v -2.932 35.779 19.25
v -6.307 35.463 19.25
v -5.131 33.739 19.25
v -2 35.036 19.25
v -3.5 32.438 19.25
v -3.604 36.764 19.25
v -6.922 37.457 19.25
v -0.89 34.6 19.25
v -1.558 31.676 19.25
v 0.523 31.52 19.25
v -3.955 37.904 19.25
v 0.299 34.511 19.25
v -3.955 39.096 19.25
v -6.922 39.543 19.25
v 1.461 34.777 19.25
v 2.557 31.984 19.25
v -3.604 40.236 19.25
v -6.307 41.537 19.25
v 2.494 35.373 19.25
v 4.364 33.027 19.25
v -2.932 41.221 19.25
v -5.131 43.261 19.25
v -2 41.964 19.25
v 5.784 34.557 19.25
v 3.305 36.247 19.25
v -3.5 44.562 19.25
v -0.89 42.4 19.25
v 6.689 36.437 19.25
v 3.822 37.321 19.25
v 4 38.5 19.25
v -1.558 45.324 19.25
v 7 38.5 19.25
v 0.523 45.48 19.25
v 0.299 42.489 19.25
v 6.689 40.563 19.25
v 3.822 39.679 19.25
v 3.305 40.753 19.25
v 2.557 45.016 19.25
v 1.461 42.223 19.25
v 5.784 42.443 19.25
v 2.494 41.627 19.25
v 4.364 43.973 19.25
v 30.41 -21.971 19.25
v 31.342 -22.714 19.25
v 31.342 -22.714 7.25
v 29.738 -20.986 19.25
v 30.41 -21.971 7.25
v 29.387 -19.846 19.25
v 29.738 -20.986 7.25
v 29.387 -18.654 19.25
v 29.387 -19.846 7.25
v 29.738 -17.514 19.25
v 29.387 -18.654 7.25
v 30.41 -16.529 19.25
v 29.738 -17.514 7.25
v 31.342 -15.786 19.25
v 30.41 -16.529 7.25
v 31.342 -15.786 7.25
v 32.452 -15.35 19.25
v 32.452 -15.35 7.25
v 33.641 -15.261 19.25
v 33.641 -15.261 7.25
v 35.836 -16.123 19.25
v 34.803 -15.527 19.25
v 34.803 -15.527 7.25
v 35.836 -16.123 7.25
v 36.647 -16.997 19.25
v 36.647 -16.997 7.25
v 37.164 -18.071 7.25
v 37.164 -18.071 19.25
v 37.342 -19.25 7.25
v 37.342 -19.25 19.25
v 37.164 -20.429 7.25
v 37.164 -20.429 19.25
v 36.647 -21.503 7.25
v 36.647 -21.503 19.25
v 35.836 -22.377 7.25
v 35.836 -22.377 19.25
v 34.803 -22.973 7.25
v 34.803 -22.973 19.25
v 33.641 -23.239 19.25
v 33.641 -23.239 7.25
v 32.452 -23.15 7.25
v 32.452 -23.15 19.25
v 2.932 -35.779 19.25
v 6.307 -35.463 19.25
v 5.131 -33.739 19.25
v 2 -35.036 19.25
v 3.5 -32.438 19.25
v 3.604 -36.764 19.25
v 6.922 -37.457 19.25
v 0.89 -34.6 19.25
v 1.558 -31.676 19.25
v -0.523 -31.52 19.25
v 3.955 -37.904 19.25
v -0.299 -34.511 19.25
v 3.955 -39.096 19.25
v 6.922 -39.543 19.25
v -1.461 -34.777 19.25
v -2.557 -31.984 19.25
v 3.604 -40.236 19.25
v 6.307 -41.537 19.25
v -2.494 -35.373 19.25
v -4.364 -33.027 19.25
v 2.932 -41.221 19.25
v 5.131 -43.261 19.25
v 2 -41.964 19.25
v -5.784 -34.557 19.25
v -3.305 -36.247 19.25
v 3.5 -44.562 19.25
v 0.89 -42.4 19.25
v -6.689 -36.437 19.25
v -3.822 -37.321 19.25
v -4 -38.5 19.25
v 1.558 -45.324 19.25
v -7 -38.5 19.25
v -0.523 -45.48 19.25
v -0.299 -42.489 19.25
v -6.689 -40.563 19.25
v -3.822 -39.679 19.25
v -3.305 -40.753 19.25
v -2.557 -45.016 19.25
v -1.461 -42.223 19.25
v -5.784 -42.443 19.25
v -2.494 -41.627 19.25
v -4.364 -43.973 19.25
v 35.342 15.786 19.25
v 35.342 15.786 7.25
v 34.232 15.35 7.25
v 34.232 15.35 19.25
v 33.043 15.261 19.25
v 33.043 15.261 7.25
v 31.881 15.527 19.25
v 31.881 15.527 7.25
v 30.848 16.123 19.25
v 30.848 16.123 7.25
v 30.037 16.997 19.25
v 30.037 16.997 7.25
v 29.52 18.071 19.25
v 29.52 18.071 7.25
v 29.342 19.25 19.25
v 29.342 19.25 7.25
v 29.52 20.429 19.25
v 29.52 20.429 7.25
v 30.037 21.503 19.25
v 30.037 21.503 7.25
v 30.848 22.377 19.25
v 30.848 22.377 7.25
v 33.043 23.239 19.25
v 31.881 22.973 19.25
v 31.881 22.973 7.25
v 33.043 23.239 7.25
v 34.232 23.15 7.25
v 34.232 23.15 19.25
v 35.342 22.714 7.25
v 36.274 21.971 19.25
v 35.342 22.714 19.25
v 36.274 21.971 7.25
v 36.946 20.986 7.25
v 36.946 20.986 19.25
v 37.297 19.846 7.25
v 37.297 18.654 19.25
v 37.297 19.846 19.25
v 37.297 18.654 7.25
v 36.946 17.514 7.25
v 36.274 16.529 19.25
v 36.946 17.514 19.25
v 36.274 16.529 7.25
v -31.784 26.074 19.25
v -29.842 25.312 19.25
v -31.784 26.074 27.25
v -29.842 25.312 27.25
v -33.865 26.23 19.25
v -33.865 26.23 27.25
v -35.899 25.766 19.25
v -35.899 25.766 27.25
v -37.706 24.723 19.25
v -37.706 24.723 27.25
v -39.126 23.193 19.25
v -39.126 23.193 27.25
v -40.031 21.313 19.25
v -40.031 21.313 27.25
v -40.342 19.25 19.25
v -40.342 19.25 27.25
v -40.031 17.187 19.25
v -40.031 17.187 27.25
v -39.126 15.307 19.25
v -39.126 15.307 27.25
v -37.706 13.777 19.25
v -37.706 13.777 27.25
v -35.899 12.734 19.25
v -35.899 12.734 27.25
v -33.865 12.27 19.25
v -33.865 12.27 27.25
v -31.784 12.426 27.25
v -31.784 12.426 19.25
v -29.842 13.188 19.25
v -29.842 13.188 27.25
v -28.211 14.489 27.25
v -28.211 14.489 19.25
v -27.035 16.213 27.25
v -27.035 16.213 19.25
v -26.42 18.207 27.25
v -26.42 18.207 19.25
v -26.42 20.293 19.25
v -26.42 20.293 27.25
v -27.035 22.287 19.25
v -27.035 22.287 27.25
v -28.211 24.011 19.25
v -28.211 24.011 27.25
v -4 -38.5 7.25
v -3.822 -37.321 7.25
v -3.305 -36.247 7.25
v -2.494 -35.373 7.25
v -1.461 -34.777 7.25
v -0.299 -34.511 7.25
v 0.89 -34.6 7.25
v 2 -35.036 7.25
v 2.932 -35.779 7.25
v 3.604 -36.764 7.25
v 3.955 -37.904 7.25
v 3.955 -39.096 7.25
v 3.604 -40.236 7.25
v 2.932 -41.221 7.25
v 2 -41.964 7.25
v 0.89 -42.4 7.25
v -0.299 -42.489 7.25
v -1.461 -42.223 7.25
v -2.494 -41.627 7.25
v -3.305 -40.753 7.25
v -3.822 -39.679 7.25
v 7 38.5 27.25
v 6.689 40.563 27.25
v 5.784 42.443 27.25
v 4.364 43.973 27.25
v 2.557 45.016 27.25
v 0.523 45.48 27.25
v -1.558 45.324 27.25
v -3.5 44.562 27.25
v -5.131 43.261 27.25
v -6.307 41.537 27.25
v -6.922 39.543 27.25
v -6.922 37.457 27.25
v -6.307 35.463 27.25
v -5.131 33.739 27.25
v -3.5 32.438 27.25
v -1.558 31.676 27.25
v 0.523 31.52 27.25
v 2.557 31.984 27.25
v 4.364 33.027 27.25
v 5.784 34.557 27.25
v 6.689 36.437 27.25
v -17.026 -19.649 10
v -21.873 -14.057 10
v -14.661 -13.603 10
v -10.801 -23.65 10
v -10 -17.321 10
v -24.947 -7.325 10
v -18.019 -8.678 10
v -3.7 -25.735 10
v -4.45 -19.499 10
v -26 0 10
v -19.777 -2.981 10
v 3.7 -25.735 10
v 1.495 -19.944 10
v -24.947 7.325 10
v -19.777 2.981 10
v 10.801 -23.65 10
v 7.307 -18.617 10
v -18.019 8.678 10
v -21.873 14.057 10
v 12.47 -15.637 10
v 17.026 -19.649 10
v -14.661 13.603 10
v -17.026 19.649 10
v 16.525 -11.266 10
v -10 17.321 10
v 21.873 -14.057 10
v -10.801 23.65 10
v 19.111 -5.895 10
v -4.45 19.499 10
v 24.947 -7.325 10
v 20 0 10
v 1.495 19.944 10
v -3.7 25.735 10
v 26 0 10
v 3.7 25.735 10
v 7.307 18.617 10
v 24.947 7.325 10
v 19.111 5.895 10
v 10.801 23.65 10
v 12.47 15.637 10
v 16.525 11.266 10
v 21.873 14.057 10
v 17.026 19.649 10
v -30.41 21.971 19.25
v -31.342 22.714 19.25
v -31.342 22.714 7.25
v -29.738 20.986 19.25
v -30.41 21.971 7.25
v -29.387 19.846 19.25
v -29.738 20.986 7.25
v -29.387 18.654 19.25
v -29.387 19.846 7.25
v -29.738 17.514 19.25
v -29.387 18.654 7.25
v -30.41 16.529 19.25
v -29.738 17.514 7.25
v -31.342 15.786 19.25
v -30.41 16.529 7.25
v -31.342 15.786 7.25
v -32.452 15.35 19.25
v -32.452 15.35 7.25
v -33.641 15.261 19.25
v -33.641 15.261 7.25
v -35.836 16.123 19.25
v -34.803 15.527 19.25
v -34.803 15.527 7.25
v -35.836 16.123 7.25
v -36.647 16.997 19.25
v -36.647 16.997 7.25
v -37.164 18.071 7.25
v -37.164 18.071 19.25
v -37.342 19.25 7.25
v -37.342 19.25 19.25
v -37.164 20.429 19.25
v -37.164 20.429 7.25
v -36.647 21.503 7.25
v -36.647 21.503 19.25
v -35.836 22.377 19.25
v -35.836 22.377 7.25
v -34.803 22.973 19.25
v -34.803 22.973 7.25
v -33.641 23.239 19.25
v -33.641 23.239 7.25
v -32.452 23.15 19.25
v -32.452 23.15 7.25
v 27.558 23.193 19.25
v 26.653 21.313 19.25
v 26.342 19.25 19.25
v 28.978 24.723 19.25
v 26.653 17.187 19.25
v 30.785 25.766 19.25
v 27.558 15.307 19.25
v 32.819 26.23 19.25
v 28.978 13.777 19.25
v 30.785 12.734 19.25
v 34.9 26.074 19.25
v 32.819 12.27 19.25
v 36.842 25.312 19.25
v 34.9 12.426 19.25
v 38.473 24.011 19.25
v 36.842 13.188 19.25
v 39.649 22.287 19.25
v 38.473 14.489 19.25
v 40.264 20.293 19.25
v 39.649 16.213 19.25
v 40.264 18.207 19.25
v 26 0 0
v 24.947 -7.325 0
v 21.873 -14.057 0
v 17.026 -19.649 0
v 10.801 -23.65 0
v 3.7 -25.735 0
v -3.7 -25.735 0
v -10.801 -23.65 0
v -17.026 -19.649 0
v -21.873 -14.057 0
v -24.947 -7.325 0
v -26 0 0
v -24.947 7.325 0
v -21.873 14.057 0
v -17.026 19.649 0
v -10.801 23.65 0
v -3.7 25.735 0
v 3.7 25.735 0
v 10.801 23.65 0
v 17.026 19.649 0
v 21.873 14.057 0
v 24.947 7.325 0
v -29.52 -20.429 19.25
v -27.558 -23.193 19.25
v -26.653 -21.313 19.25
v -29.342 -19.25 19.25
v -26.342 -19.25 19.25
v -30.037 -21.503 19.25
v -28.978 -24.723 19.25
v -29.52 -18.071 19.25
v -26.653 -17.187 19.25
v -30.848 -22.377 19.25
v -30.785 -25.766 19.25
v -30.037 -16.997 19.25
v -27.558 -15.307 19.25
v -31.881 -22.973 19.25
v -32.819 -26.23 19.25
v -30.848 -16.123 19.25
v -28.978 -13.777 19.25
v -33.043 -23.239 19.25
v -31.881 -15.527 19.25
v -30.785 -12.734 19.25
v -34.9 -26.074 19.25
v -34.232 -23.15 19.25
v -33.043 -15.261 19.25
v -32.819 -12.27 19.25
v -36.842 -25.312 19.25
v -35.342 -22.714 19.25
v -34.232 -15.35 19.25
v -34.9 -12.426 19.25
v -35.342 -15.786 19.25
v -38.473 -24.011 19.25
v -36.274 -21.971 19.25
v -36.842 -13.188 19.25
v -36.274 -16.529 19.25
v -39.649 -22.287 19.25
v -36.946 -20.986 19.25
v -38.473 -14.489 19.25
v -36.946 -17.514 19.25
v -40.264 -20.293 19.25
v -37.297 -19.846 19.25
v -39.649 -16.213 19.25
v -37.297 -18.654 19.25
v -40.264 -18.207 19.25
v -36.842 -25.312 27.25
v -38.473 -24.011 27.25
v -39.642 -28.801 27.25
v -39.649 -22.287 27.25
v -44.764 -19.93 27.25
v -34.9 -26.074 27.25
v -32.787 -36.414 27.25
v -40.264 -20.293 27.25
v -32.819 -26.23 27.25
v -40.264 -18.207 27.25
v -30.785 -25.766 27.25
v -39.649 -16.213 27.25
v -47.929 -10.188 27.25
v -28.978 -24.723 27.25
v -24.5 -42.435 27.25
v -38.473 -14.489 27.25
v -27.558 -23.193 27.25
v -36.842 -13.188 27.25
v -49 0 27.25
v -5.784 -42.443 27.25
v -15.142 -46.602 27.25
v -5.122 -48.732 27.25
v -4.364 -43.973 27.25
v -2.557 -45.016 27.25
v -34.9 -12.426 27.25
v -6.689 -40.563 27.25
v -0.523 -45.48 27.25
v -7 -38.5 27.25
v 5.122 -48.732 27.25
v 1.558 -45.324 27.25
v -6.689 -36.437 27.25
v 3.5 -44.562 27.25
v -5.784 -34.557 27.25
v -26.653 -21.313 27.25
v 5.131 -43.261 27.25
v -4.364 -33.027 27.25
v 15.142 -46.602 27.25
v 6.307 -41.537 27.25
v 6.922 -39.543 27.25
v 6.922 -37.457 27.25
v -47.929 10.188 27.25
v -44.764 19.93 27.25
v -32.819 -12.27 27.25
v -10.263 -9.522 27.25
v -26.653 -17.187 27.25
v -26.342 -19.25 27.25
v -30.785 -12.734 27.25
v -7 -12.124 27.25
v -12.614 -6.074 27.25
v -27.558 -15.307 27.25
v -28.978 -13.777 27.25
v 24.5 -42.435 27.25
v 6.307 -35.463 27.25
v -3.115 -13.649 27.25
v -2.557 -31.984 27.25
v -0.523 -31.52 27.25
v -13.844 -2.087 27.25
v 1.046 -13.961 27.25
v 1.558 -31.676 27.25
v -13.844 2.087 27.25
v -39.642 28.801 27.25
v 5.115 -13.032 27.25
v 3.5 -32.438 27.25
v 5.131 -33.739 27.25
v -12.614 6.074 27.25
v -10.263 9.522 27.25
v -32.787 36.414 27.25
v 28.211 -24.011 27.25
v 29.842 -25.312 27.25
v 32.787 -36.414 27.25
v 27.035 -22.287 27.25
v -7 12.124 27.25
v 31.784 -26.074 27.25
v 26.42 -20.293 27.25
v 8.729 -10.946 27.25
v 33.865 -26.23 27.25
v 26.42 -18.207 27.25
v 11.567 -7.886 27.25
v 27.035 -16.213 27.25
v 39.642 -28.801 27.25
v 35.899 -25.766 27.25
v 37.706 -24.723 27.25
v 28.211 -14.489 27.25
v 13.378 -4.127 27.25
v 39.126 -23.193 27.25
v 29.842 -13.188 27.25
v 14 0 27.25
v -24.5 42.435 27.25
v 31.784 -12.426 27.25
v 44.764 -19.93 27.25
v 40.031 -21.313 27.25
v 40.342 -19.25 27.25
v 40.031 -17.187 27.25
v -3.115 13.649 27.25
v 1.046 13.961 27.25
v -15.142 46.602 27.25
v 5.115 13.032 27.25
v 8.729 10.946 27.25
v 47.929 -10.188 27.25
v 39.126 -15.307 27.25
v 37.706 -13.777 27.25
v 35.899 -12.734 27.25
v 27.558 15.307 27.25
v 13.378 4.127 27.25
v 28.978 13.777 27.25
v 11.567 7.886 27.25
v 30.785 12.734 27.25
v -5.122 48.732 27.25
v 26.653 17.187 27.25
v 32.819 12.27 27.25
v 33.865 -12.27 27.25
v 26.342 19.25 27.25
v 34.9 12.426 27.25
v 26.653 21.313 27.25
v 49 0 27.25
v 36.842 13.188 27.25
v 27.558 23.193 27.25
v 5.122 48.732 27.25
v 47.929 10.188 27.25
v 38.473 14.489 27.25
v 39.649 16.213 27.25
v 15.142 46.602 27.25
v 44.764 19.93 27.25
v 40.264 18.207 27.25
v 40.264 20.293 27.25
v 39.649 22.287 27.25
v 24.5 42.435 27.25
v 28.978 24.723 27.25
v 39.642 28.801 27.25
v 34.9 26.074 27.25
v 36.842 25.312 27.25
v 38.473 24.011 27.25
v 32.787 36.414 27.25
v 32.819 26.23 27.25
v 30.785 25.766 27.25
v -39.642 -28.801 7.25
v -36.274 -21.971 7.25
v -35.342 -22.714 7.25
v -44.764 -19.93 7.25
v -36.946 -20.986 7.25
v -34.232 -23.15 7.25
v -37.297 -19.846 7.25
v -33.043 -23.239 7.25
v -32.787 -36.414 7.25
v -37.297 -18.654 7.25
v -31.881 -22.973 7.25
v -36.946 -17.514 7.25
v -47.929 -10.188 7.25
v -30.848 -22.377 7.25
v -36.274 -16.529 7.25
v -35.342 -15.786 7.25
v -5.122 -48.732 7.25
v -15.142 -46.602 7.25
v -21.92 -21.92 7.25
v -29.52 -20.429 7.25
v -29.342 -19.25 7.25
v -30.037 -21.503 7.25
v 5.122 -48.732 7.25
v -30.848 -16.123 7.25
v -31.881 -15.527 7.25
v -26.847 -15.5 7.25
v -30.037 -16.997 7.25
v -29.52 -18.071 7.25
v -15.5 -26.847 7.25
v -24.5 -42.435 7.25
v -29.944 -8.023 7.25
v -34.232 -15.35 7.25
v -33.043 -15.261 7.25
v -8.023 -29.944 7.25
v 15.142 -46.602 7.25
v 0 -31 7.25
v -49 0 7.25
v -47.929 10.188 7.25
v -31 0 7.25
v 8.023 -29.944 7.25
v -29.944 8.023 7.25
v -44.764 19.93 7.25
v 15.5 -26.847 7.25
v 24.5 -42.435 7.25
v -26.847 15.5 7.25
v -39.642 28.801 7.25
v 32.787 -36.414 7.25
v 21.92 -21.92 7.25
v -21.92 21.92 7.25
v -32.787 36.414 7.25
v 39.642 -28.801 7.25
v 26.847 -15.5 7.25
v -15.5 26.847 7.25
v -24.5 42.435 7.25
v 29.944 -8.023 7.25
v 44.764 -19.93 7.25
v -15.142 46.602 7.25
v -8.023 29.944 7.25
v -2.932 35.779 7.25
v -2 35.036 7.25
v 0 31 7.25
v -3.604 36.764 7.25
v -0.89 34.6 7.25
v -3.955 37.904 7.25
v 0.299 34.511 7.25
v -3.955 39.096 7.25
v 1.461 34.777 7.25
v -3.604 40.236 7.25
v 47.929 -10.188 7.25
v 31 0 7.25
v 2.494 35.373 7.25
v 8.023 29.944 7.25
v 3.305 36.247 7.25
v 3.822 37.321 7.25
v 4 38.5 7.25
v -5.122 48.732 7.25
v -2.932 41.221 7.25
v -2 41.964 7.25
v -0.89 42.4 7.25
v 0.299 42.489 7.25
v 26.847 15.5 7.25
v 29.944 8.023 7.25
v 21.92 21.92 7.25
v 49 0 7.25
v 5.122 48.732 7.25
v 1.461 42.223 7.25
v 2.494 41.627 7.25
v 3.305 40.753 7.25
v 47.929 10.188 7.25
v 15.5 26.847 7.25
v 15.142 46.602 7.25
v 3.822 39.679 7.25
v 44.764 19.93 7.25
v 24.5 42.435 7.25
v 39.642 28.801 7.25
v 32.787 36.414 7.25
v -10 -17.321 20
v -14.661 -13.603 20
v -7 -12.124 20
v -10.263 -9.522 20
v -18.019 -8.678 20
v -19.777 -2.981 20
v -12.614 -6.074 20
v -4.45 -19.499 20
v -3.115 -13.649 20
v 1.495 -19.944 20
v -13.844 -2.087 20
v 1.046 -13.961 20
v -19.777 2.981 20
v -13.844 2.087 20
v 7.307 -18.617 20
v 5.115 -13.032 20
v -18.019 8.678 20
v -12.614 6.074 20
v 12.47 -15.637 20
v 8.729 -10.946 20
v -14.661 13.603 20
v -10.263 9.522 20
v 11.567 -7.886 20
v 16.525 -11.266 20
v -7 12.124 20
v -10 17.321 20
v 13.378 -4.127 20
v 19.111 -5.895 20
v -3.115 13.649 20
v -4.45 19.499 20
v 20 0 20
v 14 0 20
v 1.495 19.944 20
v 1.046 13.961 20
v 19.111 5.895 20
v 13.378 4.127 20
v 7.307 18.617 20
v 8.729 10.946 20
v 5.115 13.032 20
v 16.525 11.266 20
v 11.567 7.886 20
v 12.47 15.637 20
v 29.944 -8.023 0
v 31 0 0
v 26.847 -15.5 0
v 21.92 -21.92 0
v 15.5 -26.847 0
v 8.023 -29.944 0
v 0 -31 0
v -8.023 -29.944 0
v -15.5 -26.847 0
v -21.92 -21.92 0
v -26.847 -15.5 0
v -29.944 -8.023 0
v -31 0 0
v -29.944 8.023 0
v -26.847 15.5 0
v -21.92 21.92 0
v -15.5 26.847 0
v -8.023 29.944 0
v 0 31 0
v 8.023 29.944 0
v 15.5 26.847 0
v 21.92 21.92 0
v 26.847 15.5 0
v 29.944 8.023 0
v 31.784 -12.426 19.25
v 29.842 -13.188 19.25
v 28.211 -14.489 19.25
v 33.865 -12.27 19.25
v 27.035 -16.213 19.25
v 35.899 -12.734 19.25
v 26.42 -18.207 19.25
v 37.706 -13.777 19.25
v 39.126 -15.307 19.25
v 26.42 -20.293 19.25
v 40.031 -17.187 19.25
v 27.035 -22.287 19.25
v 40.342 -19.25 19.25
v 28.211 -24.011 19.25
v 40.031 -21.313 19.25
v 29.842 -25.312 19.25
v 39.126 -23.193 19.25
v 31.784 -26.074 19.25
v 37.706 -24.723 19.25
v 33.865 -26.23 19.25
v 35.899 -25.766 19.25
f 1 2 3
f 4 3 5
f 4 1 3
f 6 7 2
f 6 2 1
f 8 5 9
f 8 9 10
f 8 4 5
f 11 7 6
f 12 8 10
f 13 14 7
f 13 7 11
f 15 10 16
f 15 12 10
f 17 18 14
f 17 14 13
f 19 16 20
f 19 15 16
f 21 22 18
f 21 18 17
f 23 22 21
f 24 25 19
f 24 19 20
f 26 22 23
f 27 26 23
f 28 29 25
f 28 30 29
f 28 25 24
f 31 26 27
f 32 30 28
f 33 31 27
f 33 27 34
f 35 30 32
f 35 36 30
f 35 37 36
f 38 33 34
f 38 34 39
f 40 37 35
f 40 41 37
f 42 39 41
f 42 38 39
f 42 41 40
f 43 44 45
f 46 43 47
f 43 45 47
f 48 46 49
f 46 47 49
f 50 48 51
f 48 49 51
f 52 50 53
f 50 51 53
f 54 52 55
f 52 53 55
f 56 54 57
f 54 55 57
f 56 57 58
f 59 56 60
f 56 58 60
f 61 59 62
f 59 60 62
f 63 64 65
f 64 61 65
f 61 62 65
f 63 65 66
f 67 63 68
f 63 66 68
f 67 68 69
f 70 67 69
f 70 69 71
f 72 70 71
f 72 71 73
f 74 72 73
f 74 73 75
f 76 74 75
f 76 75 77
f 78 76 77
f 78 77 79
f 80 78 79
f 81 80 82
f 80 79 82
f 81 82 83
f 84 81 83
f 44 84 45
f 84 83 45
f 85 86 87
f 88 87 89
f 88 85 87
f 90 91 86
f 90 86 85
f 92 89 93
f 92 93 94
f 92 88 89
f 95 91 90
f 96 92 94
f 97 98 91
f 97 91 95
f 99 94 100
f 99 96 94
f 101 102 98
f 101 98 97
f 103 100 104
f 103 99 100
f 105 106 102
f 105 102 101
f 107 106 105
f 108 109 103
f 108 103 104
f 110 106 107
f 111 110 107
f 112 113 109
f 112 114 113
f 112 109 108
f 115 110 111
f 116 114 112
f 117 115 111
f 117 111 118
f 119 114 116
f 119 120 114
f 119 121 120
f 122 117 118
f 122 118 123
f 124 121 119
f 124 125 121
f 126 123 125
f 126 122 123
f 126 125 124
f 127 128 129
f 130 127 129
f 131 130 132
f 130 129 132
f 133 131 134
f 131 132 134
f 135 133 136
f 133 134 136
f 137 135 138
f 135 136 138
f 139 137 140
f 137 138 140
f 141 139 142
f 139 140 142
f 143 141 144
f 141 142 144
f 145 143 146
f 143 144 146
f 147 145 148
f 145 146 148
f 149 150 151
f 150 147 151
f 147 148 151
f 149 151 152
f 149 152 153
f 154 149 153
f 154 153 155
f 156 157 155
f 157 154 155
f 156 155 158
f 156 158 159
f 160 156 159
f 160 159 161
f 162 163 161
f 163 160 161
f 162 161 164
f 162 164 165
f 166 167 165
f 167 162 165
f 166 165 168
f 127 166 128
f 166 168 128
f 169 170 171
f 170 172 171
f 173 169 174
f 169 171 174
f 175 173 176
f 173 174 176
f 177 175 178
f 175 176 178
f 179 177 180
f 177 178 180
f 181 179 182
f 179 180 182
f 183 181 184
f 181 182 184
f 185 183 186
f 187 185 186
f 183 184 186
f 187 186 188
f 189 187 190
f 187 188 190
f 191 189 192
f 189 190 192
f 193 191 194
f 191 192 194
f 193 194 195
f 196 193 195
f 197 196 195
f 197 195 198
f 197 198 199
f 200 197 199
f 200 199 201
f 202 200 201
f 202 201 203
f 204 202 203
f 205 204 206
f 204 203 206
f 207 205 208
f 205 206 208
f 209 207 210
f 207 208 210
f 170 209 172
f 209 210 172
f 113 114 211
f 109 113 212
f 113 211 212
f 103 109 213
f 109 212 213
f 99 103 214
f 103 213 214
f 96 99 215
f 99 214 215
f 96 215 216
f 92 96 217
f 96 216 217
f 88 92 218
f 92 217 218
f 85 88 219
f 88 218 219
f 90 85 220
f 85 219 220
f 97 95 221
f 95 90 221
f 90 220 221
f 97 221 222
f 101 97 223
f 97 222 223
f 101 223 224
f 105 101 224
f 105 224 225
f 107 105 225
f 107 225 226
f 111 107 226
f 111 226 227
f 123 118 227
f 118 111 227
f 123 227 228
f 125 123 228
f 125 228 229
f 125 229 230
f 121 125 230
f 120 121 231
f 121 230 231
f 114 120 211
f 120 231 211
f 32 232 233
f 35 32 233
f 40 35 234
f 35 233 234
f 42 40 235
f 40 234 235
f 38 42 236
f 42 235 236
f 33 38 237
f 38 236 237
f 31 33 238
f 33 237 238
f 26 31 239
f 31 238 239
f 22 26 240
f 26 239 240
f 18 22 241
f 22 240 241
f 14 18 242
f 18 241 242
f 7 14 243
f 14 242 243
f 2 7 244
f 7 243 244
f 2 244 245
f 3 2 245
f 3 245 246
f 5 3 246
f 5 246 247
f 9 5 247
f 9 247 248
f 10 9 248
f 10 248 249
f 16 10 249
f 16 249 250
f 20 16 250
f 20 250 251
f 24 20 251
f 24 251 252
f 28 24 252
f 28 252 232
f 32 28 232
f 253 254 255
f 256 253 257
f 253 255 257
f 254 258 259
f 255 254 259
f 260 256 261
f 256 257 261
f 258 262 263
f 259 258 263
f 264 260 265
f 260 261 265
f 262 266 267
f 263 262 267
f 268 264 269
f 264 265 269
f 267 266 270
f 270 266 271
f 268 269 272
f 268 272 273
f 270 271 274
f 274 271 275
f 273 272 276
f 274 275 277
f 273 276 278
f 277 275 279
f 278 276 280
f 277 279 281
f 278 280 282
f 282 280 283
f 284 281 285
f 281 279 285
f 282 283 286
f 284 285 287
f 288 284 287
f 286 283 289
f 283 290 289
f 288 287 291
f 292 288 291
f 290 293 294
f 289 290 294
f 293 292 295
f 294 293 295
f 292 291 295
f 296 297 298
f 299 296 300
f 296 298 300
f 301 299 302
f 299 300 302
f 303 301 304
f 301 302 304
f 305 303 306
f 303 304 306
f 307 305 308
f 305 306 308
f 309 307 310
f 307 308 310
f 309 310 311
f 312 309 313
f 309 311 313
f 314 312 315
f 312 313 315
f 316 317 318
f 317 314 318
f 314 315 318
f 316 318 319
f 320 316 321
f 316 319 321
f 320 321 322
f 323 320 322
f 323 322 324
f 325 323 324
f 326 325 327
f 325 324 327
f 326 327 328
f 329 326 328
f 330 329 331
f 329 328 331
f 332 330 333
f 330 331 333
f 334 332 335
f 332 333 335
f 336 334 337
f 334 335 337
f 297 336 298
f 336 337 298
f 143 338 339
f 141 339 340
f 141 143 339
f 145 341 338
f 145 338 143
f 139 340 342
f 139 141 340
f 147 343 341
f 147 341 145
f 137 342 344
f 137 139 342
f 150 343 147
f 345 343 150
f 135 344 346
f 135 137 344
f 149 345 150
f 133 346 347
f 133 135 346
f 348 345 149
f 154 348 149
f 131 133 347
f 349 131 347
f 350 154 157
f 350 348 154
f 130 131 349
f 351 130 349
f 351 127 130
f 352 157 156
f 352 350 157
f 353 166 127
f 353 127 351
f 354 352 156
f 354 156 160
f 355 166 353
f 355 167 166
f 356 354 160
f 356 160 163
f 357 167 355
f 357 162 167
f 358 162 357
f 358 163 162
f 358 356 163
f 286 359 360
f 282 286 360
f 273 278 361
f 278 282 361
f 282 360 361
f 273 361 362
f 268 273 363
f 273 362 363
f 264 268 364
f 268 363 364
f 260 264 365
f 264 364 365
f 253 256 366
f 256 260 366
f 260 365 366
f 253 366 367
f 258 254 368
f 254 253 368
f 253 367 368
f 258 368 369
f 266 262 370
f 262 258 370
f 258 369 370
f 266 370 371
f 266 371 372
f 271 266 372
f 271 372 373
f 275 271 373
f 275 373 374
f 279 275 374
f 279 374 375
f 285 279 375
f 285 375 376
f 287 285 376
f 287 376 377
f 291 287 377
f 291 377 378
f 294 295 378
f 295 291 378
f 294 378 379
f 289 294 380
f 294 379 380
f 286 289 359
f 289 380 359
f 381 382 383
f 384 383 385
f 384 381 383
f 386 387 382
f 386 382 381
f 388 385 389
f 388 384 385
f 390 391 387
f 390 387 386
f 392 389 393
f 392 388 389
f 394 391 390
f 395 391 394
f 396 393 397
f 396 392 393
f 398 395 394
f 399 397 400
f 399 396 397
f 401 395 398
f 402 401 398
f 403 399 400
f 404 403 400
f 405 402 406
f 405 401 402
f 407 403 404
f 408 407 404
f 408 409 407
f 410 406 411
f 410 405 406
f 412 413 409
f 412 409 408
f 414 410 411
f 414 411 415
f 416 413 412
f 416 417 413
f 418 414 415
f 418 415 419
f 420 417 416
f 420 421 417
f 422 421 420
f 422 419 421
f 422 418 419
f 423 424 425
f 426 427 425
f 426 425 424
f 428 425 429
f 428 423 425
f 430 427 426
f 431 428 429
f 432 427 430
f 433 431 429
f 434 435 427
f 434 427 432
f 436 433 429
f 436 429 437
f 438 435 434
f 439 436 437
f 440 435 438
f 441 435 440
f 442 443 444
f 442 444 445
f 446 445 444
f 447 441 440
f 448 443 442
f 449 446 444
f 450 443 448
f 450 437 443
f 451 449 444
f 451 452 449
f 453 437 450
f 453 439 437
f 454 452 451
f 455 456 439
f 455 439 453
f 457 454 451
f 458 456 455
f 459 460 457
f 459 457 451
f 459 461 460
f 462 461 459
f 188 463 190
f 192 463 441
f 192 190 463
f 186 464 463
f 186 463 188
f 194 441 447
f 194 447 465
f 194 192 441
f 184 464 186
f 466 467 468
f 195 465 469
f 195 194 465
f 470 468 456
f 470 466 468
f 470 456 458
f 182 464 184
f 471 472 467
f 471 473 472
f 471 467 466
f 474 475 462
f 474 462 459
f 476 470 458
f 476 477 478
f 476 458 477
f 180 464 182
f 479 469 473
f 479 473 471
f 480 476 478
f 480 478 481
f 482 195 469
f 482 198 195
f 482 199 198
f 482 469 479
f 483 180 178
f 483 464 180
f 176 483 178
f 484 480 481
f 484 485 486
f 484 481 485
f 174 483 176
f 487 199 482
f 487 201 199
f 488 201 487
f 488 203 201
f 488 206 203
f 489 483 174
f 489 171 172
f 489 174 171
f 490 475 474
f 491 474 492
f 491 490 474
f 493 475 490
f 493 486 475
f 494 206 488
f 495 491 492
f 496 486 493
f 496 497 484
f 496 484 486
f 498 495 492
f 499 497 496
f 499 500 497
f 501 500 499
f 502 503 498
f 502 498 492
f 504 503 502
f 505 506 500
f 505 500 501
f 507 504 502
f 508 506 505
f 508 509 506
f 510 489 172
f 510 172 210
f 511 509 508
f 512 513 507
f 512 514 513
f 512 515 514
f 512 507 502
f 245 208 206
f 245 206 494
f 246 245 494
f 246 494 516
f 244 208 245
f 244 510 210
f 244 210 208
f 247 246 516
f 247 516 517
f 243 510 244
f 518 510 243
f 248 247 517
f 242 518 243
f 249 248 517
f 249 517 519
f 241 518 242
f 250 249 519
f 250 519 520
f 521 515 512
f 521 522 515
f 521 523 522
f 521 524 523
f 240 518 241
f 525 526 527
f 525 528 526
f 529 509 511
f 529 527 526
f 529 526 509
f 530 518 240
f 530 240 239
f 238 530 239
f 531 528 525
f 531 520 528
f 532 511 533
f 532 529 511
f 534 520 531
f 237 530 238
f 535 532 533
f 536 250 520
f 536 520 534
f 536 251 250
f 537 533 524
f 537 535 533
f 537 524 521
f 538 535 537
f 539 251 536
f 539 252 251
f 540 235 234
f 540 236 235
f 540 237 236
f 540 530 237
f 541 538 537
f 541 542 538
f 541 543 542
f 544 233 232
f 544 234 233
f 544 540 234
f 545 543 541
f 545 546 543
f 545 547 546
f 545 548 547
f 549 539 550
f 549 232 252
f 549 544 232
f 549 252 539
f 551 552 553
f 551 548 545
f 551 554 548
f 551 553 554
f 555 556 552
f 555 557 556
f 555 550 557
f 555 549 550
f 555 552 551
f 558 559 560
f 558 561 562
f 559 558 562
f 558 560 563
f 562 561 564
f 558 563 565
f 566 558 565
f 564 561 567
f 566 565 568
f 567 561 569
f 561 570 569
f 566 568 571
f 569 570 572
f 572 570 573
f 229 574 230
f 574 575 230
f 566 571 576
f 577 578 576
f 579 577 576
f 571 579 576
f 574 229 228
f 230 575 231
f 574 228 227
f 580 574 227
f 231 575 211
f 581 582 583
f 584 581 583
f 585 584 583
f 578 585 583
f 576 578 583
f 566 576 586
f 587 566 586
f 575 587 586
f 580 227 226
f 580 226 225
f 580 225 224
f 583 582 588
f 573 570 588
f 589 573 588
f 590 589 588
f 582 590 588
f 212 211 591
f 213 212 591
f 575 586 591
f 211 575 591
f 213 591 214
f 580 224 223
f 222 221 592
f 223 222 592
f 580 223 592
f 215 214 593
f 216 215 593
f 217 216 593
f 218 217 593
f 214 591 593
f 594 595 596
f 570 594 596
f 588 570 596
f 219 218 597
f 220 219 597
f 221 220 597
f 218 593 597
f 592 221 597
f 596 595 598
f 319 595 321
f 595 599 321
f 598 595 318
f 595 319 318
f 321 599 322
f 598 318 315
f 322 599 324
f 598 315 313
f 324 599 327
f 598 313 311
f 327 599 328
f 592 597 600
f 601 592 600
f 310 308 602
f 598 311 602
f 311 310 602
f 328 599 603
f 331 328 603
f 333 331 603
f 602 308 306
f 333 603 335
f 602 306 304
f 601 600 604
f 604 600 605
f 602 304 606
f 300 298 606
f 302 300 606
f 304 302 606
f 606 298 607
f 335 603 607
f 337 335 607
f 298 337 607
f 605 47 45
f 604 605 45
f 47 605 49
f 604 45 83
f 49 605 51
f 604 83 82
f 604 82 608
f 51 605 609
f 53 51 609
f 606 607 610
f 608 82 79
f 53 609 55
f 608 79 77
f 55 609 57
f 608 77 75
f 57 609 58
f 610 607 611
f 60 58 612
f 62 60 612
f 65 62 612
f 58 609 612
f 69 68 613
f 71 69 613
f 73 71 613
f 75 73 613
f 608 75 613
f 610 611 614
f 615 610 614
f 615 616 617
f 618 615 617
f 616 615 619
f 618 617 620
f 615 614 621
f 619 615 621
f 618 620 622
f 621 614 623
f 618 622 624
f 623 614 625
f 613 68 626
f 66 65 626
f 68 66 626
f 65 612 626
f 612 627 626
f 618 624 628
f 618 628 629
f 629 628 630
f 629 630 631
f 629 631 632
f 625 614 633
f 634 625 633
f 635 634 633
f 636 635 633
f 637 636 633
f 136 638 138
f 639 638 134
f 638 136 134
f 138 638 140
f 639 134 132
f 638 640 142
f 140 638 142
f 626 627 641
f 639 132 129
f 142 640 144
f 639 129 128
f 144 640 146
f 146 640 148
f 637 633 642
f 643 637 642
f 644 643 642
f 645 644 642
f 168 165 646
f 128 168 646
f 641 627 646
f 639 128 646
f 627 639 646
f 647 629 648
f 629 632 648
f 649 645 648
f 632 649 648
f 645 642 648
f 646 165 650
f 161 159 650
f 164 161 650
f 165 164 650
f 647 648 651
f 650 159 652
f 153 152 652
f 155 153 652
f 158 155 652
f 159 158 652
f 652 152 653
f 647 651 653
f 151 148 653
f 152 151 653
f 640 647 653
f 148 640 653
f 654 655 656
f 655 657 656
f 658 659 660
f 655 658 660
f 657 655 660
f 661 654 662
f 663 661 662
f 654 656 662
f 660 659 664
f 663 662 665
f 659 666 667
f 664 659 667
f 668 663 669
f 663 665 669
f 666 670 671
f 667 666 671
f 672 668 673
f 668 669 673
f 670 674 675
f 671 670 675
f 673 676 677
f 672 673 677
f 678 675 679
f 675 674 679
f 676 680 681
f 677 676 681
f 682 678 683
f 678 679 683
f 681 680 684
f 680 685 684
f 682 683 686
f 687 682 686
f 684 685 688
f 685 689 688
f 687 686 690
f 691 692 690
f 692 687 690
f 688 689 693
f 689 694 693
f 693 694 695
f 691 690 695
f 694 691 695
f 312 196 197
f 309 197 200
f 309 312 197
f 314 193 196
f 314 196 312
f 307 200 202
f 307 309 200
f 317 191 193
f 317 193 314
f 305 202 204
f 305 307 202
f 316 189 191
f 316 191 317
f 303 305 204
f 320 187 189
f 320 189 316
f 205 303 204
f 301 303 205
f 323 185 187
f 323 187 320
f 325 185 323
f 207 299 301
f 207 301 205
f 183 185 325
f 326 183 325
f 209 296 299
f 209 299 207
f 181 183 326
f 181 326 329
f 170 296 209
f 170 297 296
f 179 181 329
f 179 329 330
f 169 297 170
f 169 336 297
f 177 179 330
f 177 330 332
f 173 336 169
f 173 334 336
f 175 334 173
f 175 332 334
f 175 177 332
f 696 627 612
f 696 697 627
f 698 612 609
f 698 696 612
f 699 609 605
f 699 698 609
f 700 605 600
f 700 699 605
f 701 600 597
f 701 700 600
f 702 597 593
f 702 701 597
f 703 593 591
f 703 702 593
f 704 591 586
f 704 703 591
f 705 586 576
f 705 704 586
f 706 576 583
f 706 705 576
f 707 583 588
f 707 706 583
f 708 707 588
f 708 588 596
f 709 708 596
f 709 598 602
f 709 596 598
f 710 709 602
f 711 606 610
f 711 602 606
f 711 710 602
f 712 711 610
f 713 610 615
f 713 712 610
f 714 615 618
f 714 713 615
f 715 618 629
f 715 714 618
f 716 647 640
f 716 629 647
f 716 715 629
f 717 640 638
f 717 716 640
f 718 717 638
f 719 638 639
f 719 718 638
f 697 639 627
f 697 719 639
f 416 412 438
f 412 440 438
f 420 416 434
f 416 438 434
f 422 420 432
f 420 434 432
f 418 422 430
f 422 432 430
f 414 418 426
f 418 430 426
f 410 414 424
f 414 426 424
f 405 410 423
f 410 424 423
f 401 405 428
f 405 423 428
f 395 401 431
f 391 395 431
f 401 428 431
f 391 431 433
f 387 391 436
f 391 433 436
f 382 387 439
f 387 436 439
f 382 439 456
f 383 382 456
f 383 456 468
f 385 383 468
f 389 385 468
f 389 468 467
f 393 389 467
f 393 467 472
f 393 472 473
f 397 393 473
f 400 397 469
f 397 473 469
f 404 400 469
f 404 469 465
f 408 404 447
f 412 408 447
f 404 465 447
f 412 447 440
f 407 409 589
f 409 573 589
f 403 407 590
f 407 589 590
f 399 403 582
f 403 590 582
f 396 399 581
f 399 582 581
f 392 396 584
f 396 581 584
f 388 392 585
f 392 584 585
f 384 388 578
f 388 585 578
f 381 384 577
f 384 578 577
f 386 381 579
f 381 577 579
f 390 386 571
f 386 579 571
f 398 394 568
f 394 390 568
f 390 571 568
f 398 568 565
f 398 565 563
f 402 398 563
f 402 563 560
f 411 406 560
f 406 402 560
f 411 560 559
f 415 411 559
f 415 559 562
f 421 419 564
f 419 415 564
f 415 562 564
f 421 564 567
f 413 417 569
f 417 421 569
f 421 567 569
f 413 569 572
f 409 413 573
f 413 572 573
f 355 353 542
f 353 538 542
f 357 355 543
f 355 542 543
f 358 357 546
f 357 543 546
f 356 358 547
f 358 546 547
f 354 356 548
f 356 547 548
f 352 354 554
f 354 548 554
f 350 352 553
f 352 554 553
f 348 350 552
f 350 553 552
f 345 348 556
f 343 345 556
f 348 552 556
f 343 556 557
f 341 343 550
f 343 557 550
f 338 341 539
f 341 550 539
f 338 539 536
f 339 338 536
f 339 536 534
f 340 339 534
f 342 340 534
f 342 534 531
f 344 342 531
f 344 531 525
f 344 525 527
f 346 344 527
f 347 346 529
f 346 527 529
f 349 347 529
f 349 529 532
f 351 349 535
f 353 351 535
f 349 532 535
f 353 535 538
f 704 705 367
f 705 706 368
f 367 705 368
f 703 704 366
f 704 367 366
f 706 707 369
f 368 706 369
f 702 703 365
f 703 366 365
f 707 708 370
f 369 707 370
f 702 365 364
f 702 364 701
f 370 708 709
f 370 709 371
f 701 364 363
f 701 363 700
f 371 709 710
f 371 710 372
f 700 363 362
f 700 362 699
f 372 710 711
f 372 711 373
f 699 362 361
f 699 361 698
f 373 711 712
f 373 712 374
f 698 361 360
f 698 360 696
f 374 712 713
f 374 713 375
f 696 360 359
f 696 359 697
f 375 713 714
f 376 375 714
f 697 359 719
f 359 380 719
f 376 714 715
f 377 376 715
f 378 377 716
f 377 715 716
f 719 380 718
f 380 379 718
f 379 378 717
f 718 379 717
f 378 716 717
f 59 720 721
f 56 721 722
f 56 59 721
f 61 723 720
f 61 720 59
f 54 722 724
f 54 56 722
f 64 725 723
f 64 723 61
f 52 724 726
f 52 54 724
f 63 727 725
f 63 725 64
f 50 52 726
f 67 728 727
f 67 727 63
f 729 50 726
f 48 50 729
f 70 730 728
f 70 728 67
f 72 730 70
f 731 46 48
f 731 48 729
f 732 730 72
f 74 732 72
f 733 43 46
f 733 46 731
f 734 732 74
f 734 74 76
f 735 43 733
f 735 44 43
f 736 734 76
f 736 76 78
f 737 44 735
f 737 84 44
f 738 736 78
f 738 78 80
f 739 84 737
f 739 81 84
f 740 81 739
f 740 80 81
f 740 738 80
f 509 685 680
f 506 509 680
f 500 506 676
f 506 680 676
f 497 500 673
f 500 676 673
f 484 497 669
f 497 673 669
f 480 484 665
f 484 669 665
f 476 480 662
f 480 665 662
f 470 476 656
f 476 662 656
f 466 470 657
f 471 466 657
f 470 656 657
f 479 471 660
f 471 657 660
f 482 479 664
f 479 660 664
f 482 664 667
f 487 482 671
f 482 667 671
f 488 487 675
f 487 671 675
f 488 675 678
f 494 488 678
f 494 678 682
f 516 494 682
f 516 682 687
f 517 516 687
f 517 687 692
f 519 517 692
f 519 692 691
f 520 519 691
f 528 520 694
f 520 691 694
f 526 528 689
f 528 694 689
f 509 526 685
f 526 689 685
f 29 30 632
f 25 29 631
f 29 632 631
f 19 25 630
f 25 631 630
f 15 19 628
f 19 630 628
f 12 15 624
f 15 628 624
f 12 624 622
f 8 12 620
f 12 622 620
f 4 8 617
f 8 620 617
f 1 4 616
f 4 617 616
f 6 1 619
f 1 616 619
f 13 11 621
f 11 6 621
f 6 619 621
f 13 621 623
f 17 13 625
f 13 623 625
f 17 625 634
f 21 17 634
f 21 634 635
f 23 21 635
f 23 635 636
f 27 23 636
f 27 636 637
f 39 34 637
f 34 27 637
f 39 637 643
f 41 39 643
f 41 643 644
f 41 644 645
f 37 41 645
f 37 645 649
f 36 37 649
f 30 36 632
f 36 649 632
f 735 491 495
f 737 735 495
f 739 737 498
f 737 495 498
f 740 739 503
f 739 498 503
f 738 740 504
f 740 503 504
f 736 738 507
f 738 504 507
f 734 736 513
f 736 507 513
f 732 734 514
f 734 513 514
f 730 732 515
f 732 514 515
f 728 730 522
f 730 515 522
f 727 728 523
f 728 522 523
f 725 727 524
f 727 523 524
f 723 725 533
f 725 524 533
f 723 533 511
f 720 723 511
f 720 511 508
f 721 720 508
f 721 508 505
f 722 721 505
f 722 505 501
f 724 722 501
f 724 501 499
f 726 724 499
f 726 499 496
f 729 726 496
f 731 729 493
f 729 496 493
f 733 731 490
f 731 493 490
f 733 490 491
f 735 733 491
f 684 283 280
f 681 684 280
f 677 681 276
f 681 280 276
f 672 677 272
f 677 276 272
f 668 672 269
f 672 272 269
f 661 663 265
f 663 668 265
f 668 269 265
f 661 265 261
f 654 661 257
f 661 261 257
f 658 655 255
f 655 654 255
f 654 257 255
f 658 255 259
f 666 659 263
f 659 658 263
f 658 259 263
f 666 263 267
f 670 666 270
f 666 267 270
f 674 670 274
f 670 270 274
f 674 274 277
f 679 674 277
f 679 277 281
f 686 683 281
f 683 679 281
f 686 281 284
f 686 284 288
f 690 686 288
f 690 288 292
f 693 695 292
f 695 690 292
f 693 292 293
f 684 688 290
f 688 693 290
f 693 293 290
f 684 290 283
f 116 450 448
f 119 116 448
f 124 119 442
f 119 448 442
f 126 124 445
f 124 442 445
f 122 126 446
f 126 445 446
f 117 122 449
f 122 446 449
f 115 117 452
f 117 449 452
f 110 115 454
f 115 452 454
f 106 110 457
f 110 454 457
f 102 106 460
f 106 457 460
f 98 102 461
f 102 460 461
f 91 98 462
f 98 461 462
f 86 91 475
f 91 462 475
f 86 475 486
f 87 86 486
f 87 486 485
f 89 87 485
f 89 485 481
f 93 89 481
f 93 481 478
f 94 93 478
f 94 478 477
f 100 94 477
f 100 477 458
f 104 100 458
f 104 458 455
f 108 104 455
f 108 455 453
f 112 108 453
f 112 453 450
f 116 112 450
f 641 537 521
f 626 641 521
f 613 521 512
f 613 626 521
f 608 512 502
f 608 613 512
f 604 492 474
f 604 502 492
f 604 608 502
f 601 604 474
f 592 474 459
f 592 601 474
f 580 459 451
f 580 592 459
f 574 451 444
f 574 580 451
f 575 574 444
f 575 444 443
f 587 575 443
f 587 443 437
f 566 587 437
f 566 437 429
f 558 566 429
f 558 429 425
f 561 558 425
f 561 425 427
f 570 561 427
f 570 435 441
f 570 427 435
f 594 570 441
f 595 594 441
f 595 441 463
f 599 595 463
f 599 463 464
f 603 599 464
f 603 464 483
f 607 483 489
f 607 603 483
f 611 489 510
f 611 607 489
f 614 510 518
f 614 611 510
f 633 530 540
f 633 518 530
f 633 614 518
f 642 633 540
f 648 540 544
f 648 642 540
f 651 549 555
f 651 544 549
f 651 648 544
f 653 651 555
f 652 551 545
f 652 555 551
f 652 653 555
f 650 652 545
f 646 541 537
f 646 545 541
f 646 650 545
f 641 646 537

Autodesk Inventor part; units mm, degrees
ref_plane "YZ Plane" through (0, 0, 0) normal (1, 0, 0) x (0, 1, 0)
ref_plane "XZ Plane" through (0, 0, 0) normal (0, 1, 0) x (-1, 0, 0)
ref_plane "XY Plane" through (0, 0, 0) normal (0, 0, 1) x (1, 0, 0)
sketch "Sketch1" plane through (0, 0, 0) normal (0, 0, 1) x (1, 0, 0)
  circle A0 centre (0, 0) radius 14
  circle A1 centre (0, 0) radius 20
  circle A2 centre (0, 0) radius 26
  circle A3 centre (0, 0) radius 31
  circle A4 centre (0, 0) radius 49
  circle A5 centre (0, 38.5) radius 7
  circle A6 centre (0, 38.5) radius 4
  dimension "d0" = 28
  dimension "d1" = 40
  dimension "d2" = 52
  dimension "d3" = 62
  dimension "d4" = 98
  dimension "d5" = 14
  dimension "d6" = 8
  dimension "d7" = 38.5
extrude "Extrusion1" add sketch "Sketch1" along normal blind 27.25 contours A0 | A1 | A2 | A3 | A4 | A5 | A6
extrude "Extrusion2" cut sketch "Sketch1" along normal through all contours A0
extrude "Extrusion3" cut sketch "Sketch1" along normal blind 7.25 contours A4 | A5 | A6
extrude "Extrusion4" cut sketch "Sketch1" along normal through all contours A6
extrude "Extrusion5" cut sketch "Sketch1" against normal blind 8 from surface at 27.25 contours A5
pattern_circular "Circular Pattern1" count 6 over 360 about axis through (0, 0, -10) along (0, 0, 1) of "Extrusion5", "Extrusion4"
extrude "Extrusion6" cut sketch "Sketch1" along normal blind 10 contours A0 | A1 | A2
extrude "Extrusion7" cut sketch "Sketch1" along normal blind 10 from surface at 10 contours A1
properties part number "B2"
